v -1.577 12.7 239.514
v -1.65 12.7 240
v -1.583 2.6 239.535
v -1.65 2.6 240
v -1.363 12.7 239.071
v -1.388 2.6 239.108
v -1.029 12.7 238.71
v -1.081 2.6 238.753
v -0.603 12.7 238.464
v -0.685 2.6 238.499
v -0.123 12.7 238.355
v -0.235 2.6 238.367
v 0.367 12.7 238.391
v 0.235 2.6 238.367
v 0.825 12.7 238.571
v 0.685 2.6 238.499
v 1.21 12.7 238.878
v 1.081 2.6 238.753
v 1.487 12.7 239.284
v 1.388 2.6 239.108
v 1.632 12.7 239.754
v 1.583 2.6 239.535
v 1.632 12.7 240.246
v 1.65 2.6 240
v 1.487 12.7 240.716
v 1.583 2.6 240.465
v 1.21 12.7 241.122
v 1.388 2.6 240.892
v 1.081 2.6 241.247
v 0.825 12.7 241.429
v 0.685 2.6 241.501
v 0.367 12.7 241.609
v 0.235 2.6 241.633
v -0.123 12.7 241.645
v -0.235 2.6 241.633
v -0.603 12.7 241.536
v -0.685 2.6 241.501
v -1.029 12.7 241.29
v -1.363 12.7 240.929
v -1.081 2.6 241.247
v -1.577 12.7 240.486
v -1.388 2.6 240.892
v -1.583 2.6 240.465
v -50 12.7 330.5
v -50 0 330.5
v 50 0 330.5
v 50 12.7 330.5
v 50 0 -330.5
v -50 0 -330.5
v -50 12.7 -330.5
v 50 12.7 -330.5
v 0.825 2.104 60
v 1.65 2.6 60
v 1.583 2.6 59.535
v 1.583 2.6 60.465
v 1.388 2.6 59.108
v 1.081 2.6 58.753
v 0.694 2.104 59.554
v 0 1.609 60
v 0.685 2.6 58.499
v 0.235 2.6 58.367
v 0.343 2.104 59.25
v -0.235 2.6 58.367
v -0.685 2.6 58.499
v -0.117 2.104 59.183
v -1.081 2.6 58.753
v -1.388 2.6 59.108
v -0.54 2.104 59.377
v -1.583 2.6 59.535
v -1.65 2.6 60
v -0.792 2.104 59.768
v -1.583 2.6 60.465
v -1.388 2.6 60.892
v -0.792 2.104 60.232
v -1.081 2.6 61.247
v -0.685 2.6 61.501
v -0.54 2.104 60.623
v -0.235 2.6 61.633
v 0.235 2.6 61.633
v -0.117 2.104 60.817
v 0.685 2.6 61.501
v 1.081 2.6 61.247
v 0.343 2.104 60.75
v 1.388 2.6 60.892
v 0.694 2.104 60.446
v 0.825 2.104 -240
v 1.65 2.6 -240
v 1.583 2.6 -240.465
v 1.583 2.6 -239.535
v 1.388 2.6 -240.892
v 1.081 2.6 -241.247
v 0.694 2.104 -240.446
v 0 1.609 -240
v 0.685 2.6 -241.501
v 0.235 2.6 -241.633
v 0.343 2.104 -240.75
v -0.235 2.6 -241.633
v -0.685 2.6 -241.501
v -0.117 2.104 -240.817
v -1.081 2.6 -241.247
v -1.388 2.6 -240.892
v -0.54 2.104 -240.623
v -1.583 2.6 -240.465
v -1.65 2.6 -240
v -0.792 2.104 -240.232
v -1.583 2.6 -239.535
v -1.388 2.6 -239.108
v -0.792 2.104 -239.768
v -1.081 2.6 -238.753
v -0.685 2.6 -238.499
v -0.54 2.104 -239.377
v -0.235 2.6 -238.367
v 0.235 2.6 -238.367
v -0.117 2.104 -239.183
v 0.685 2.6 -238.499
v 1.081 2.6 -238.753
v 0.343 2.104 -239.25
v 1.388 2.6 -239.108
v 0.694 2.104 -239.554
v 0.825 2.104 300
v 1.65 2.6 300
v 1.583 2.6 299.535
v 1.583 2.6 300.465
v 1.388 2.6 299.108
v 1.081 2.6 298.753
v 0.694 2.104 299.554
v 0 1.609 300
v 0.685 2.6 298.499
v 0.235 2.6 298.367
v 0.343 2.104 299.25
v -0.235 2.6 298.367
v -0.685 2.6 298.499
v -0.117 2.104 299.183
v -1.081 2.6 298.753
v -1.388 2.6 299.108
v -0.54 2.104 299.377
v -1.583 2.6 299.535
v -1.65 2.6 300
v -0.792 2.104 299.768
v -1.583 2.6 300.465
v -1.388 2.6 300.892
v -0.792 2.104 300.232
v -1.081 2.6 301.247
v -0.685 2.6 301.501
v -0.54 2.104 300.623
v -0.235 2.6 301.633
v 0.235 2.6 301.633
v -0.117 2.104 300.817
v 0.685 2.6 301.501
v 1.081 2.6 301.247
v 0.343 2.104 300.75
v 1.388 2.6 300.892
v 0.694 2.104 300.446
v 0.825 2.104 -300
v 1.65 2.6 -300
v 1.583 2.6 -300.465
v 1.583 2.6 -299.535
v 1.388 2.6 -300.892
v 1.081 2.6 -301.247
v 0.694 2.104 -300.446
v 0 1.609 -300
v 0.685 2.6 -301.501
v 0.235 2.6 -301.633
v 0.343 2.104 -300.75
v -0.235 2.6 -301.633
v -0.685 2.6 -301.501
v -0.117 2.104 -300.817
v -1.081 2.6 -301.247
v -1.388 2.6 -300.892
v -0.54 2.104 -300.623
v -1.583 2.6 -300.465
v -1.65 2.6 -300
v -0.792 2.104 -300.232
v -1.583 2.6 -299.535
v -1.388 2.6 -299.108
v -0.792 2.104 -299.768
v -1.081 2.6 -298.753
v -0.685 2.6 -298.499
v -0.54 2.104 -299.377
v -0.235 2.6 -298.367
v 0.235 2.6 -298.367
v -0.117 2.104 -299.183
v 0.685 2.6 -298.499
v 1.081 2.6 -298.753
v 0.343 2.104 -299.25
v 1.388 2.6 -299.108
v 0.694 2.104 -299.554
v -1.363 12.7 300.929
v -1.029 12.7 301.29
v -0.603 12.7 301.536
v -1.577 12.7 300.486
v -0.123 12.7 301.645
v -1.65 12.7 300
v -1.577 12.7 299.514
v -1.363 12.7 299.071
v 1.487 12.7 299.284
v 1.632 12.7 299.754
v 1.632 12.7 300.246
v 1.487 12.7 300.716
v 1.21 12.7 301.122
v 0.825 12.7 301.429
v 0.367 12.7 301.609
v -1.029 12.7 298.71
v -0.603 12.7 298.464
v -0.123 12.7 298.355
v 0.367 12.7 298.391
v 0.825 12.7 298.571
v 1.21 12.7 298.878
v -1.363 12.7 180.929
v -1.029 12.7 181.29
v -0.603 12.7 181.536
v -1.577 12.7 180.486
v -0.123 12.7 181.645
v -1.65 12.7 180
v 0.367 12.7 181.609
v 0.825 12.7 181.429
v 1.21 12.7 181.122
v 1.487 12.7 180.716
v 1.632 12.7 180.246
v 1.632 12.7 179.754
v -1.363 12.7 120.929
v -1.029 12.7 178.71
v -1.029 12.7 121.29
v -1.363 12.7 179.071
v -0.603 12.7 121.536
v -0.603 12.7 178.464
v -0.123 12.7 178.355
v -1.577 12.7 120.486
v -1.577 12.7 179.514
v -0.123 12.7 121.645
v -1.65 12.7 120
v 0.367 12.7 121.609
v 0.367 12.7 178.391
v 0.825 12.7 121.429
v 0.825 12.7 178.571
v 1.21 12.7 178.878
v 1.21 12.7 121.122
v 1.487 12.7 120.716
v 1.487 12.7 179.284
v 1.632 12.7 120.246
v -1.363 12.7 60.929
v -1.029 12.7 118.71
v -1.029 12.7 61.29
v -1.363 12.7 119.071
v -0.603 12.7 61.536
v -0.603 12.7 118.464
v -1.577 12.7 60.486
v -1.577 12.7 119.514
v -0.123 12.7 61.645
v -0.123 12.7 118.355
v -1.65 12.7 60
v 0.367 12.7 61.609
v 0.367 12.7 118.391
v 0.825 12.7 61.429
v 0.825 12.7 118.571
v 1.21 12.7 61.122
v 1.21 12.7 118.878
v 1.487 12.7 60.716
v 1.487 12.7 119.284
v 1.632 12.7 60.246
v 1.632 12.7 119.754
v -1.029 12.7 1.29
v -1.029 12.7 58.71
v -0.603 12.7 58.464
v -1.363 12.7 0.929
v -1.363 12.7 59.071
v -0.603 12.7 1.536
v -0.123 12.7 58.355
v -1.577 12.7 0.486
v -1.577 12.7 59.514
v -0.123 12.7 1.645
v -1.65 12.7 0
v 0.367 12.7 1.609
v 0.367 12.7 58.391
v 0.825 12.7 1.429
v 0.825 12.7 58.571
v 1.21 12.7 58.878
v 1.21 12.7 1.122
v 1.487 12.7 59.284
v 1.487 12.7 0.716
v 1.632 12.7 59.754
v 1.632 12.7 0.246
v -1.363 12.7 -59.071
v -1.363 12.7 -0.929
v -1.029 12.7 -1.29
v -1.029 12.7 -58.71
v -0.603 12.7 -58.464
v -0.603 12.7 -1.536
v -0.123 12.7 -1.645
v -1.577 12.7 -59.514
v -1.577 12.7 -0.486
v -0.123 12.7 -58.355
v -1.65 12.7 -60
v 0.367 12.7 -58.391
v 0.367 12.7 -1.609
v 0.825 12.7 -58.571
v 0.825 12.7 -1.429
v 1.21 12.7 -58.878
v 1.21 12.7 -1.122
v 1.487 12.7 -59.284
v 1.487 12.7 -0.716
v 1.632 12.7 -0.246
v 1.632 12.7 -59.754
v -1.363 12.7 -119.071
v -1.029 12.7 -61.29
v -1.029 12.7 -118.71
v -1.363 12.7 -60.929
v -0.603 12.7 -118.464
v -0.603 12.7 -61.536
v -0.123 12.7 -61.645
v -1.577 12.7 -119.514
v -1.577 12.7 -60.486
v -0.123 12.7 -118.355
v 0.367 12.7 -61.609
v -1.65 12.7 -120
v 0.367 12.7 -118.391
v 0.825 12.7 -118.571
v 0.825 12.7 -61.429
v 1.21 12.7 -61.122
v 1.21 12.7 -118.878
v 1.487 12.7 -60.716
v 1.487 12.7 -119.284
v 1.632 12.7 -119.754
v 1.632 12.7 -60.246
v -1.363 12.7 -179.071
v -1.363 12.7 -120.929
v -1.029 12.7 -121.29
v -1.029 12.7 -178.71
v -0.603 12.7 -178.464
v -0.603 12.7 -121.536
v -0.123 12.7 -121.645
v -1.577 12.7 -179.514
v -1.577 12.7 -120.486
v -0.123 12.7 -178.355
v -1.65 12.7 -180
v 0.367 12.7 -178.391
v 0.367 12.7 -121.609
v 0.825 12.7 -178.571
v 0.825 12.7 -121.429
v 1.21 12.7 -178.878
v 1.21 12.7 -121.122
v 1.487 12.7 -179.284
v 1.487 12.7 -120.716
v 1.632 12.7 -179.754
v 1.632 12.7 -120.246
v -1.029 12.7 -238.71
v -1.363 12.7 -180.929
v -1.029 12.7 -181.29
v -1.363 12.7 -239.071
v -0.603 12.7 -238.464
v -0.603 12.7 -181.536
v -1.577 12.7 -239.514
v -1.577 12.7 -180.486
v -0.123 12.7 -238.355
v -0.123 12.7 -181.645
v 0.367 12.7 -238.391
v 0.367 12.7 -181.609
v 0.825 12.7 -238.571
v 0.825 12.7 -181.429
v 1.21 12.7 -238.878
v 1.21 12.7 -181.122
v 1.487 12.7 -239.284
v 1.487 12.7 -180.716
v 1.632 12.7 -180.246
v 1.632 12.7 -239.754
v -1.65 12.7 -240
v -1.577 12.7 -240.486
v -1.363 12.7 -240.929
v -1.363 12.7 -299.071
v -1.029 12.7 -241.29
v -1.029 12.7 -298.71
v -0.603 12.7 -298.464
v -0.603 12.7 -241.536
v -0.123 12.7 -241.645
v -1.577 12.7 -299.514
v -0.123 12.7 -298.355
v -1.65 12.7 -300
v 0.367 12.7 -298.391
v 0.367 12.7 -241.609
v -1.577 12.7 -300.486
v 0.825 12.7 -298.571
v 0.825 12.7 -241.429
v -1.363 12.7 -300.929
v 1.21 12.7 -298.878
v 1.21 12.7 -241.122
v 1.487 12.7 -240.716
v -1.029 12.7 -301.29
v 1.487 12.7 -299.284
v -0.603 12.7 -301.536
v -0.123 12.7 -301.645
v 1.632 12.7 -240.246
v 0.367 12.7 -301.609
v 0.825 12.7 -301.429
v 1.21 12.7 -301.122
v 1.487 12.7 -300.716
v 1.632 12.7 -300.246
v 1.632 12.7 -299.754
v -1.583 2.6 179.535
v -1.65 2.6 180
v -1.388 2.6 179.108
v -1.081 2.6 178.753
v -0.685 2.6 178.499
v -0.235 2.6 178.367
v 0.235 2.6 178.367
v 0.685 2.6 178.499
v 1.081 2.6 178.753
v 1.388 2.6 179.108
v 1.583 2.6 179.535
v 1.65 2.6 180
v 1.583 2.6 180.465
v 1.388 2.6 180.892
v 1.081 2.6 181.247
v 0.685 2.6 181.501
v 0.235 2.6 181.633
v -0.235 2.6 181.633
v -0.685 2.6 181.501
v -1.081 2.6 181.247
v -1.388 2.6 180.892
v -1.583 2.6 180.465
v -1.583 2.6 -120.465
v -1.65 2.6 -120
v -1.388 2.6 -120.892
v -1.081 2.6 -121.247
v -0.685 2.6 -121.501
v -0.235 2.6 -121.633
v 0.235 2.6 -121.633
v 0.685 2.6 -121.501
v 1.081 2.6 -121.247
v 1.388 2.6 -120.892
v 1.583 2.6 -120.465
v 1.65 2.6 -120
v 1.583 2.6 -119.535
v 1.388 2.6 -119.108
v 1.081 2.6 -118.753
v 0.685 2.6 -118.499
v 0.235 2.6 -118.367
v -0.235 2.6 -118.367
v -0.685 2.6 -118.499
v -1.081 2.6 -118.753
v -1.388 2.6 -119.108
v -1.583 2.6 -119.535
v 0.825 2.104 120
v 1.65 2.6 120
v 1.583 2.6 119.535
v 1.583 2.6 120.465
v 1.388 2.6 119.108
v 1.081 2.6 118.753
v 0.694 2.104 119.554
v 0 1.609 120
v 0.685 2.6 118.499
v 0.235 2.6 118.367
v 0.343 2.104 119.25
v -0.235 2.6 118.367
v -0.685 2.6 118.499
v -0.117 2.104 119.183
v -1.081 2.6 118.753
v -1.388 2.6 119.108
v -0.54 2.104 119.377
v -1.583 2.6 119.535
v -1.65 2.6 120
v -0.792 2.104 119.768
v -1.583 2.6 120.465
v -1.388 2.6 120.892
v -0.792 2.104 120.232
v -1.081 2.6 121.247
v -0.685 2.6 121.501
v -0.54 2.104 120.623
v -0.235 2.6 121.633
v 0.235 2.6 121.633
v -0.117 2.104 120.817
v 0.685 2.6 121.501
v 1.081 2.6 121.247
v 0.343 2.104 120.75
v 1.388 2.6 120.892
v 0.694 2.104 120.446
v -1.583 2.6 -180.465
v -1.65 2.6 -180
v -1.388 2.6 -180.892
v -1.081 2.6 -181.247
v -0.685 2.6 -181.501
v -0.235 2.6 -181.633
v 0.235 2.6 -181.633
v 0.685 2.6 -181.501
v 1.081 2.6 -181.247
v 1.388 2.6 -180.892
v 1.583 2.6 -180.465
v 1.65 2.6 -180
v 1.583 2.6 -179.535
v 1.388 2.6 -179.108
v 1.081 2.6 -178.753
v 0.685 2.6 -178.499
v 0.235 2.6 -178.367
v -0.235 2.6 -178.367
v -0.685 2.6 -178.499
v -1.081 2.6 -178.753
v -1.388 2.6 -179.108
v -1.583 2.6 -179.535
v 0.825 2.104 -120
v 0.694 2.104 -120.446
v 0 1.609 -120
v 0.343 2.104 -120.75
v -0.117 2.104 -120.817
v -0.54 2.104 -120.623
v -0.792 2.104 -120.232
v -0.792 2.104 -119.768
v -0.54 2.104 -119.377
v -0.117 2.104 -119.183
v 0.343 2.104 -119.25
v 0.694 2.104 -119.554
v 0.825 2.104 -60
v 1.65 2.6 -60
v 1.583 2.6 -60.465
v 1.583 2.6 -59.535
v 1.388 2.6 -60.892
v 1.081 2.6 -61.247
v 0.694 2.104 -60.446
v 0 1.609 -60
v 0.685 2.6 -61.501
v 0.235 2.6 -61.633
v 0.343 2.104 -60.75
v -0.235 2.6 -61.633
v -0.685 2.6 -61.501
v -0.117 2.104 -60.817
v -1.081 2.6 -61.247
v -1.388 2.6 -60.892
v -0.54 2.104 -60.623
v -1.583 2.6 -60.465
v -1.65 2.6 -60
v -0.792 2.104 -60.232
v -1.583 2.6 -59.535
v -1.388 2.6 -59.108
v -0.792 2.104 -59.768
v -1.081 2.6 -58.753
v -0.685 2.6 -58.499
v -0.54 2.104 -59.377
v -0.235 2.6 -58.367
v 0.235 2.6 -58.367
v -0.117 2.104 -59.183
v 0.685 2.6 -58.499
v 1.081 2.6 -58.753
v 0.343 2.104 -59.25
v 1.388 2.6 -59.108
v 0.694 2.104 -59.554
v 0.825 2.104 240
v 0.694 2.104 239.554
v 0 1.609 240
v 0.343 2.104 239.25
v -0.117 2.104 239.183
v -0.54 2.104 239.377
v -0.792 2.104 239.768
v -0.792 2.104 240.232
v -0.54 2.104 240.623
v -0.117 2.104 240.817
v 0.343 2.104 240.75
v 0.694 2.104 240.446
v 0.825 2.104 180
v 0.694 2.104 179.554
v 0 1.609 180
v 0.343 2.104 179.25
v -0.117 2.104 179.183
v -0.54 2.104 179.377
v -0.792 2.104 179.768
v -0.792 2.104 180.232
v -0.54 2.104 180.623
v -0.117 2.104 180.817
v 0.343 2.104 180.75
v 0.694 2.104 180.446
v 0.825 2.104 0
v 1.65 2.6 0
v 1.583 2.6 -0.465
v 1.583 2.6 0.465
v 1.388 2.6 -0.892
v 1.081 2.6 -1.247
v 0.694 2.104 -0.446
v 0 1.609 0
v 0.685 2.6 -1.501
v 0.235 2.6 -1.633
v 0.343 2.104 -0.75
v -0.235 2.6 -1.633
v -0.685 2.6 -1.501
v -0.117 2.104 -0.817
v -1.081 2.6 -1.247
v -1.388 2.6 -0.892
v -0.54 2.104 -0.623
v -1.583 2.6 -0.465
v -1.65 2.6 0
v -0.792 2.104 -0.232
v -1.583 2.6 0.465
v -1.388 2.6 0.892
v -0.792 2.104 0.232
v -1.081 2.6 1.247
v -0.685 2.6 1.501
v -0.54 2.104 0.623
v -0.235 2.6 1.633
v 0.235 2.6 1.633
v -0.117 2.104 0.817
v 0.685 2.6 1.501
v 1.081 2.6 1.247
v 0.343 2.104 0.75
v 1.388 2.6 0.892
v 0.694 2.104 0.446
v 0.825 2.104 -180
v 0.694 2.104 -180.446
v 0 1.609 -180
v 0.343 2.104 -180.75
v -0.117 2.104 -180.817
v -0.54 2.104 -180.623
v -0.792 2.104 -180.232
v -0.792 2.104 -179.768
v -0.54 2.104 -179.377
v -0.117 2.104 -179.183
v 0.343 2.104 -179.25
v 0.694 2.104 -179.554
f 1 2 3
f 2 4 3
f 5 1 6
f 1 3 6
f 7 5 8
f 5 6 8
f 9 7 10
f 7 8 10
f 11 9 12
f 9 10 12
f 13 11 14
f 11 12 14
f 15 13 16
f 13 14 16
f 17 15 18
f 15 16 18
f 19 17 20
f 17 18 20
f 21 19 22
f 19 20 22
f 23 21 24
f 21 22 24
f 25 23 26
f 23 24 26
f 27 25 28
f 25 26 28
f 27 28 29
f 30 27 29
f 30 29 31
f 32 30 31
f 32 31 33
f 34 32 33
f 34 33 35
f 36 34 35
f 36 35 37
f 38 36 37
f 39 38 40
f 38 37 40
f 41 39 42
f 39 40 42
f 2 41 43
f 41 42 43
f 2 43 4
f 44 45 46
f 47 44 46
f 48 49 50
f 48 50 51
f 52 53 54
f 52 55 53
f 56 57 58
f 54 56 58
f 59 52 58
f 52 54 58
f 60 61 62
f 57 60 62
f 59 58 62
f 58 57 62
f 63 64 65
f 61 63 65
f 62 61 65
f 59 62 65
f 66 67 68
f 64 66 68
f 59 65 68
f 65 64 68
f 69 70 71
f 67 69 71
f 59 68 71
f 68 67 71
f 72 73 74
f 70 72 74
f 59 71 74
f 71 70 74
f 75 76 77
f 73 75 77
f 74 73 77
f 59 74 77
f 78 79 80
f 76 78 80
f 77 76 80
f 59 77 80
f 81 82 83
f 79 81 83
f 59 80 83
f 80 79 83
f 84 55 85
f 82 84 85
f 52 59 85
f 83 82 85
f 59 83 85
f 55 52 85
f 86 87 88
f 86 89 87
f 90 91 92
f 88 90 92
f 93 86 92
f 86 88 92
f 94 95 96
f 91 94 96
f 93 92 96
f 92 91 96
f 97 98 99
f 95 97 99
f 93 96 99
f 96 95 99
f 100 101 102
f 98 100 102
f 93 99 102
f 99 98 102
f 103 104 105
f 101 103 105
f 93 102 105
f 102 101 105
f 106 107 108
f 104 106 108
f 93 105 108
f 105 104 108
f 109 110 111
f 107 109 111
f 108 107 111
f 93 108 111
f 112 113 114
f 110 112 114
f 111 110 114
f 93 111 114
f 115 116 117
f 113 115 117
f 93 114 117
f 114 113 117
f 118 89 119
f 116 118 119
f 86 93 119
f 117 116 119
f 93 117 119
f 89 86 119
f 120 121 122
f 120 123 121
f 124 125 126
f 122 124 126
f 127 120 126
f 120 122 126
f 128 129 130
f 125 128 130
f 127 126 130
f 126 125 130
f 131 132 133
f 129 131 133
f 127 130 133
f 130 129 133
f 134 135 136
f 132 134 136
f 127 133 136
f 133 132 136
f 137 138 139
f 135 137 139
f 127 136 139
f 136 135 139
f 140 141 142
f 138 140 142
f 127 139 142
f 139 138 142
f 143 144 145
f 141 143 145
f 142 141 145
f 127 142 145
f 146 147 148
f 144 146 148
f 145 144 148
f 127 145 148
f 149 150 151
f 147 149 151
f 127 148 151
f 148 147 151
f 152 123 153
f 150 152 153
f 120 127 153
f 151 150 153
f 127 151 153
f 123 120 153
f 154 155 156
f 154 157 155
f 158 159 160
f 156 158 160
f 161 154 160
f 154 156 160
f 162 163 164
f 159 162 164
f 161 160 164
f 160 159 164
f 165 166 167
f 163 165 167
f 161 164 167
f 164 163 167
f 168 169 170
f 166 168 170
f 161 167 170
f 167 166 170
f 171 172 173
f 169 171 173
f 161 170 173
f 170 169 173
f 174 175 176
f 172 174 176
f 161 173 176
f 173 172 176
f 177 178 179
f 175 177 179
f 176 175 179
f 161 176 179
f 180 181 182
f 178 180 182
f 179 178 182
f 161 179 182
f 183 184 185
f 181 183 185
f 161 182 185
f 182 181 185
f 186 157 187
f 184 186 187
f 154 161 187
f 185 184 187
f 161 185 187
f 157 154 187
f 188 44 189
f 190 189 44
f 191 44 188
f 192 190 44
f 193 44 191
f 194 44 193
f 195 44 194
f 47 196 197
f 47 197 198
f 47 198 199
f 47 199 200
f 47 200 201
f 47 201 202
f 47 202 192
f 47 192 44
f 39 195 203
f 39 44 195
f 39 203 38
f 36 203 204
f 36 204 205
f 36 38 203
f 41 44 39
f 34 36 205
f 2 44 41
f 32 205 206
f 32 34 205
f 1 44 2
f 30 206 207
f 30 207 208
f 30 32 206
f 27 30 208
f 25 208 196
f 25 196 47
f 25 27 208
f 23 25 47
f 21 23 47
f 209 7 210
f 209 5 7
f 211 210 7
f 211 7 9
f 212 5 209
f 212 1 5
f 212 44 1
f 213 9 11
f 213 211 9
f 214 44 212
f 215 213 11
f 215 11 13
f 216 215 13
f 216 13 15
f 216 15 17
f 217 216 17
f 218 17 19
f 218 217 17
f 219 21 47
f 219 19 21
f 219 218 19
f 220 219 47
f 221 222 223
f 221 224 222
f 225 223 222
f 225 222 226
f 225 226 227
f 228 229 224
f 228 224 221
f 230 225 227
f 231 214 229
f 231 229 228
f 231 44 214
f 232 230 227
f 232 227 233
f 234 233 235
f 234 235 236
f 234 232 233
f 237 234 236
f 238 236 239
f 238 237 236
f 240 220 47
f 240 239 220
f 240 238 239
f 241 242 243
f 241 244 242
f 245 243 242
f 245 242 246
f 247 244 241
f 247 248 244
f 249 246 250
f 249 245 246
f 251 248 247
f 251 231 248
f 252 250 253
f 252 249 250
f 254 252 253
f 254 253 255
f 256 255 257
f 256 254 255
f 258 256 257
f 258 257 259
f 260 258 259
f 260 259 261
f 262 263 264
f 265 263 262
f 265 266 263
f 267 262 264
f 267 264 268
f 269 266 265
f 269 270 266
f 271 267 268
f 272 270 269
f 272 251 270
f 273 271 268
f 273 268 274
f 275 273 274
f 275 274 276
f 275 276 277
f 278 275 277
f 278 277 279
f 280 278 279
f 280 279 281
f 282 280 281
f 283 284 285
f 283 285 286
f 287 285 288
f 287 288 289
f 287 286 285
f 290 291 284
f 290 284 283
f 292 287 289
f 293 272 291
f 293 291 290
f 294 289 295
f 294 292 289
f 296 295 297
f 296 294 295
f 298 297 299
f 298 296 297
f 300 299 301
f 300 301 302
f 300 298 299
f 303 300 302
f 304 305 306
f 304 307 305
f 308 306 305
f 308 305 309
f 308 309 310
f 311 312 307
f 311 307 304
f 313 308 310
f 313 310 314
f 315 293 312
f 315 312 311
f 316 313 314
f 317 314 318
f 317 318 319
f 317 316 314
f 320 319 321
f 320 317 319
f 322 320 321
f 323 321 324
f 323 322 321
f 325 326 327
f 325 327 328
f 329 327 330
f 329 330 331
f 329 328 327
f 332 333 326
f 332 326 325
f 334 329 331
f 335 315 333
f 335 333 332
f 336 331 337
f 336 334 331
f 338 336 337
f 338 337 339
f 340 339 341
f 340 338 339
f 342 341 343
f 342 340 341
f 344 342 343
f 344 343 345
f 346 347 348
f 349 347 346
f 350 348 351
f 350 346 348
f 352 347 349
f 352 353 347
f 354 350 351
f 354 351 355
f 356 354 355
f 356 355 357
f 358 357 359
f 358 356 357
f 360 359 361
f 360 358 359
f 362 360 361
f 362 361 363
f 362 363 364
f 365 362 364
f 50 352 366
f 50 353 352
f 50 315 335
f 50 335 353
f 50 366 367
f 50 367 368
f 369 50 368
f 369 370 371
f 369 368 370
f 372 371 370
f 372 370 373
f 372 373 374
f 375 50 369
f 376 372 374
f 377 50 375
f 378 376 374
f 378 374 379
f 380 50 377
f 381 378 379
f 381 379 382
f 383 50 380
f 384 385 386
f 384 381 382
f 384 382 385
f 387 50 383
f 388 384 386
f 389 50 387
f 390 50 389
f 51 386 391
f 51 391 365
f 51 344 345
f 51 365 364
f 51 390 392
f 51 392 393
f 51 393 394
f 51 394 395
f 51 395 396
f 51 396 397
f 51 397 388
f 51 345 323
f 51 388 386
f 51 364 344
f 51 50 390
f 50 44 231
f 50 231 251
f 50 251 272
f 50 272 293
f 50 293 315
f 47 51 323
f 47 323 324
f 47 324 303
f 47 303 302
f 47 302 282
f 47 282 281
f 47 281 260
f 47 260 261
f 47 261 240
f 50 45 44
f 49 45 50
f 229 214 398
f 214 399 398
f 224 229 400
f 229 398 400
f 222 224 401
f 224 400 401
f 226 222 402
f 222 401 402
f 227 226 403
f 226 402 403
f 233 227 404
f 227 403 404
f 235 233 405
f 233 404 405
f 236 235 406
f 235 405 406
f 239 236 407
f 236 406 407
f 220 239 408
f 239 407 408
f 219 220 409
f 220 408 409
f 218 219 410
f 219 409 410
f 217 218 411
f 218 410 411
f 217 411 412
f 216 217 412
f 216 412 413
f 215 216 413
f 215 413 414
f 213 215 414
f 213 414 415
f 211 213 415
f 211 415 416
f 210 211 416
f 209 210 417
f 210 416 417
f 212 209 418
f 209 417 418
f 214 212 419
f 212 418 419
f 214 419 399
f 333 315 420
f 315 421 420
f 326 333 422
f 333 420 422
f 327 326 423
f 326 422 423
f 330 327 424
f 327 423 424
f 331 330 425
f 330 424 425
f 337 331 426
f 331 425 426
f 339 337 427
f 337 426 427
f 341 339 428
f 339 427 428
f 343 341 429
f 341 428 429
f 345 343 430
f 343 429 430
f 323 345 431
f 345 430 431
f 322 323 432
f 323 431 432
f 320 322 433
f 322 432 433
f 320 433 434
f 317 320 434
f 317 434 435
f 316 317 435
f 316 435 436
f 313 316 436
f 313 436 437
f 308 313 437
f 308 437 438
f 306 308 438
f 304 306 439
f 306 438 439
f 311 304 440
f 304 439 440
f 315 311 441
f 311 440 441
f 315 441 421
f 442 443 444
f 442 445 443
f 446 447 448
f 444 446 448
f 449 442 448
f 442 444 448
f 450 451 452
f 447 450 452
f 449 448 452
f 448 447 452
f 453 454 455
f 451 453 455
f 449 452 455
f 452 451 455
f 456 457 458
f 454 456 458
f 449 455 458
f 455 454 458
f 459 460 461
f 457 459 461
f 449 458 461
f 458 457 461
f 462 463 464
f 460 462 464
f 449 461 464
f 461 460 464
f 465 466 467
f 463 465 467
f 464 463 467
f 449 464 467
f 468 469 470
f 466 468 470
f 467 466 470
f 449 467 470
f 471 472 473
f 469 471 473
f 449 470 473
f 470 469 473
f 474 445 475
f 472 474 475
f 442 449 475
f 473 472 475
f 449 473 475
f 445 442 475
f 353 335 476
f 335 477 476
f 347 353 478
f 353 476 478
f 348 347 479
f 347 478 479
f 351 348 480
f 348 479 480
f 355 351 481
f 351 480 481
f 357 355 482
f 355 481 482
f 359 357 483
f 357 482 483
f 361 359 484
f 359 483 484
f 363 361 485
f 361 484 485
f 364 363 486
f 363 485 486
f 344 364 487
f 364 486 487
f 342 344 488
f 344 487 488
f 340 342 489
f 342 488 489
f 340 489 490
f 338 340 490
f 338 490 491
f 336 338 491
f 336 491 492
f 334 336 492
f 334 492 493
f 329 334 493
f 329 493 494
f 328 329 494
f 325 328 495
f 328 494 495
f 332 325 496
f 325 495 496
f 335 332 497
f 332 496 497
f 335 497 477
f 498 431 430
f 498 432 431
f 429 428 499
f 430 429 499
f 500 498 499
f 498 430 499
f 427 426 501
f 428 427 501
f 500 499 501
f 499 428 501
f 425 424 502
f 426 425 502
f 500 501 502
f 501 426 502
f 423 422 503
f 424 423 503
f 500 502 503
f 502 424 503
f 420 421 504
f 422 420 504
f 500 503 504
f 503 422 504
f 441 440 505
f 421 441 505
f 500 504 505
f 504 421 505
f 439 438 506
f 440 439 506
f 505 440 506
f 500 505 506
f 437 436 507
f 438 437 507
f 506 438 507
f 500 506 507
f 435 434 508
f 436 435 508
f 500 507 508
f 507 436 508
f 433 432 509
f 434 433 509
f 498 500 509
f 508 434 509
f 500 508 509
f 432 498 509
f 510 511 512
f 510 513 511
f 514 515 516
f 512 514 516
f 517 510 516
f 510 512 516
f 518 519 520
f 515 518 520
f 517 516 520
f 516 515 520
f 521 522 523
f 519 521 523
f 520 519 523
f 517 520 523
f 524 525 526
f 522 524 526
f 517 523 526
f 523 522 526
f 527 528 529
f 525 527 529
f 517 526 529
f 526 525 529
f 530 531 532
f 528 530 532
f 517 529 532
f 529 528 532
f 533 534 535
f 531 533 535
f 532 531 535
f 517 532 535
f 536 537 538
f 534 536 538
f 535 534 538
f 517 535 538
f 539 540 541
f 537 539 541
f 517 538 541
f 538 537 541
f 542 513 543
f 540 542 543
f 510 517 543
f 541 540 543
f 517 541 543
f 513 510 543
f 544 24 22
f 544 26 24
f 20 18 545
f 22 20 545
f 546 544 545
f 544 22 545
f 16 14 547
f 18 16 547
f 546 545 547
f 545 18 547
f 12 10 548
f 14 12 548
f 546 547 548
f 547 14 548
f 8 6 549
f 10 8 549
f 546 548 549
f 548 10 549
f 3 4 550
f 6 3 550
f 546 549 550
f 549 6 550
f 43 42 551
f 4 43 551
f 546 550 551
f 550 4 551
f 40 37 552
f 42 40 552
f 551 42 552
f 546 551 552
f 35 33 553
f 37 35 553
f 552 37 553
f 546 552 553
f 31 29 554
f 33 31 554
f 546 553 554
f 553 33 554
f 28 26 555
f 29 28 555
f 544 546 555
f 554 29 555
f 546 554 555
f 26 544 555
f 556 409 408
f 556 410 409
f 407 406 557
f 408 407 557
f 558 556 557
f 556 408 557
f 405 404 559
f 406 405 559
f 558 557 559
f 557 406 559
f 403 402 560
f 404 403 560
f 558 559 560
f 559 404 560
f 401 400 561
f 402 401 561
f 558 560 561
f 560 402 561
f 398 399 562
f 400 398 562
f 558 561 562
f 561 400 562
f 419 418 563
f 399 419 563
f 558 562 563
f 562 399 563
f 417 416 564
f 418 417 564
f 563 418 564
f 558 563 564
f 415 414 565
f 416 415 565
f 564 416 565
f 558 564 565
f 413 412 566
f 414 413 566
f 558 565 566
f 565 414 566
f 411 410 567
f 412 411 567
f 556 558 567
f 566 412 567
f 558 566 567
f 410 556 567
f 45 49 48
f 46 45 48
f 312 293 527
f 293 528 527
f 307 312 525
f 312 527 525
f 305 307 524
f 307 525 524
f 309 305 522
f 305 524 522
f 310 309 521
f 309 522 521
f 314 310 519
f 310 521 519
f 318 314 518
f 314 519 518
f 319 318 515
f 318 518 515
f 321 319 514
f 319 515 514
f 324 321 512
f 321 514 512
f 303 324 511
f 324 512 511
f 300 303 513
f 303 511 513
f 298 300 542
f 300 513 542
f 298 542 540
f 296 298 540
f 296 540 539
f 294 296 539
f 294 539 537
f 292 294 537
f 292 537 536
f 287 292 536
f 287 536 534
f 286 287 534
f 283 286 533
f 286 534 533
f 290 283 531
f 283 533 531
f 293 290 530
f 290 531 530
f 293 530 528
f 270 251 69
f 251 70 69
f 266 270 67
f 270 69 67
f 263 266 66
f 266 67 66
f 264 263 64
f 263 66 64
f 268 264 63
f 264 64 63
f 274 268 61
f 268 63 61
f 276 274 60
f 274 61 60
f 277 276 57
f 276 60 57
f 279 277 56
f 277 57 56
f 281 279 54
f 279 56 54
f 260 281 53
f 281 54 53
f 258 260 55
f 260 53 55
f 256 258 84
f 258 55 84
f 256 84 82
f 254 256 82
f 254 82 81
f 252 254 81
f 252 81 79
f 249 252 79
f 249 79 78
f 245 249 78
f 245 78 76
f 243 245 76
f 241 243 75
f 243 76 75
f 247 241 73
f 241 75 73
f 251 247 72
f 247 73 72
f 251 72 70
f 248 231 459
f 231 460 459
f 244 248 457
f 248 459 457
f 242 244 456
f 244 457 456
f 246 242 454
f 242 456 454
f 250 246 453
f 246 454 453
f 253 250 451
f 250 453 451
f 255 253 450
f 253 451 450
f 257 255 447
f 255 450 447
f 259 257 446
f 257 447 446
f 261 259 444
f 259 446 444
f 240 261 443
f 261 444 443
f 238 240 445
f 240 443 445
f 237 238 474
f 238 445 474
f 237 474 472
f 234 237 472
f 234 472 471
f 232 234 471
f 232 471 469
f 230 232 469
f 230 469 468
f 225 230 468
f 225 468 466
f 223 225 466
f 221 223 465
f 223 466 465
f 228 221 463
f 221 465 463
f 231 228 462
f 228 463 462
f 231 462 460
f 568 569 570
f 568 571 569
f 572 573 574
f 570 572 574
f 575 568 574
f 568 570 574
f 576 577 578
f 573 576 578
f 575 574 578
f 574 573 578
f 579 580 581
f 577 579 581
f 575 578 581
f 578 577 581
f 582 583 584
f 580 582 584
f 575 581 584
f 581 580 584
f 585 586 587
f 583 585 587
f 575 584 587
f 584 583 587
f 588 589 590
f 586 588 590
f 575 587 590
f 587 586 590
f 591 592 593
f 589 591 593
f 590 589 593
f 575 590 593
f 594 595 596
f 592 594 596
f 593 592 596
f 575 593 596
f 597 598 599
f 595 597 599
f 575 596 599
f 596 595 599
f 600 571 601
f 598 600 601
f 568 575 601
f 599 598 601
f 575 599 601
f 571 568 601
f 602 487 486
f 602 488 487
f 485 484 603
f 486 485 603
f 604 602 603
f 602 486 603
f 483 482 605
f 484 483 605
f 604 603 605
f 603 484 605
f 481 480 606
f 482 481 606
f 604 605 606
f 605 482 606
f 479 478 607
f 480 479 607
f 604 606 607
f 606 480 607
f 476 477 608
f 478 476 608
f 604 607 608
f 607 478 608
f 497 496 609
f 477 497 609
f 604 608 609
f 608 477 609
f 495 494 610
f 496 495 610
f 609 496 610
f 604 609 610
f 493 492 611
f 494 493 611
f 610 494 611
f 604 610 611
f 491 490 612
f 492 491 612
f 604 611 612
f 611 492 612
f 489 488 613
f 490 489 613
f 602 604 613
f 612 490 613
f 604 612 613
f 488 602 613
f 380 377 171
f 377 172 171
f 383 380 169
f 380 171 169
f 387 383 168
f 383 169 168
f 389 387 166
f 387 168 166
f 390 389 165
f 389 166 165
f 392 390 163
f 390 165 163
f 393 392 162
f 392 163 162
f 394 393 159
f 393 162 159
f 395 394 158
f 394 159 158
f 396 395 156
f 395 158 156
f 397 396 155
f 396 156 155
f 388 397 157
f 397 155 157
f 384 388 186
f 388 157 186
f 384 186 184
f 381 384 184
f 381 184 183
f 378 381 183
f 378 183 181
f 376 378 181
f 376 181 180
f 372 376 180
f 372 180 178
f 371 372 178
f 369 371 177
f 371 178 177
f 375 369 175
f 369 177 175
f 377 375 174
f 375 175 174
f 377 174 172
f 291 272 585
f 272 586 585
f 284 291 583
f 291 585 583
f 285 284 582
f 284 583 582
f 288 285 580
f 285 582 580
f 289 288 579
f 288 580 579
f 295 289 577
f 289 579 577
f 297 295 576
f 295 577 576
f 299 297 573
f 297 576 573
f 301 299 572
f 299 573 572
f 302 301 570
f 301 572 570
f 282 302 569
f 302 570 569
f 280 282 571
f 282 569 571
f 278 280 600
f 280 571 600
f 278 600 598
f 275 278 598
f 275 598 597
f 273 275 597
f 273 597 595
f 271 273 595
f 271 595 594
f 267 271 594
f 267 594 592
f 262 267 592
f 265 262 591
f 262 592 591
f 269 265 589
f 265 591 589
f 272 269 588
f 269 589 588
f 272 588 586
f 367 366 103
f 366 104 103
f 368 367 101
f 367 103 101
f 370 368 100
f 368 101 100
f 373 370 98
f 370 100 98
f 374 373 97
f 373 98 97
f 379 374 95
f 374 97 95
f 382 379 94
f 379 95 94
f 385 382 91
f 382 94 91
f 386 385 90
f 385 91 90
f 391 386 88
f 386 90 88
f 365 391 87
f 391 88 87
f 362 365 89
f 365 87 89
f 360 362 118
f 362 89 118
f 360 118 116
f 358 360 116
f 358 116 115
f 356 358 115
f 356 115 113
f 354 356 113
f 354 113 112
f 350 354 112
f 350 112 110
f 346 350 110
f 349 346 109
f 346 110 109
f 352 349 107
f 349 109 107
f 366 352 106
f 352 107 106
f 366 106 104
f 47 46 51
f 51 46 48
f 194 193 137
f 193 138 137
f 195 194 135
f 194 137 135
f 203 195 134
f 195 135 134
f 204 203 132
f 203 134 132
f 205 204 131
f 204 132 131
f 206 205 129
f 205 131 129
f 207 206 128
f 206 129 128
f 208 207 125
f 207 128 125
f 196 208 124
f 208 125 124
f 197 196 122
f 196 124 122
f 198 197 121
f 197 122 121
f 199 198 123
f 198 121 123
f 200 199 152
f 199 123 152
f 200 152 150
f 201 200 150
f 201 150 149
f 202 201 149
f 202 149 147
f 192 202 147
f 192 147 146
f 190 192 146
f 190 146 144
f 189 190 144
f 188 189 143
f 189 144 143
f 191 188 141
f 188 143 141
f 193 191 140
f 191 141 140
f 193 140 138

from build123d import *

# Parameters (mm, degrees)
SKETCH2_W                 = 100
SKETCH2_H                 = 661
BOSS_EXTRUDE1_DEPTH       = 12.7
M4X0_7_TAPPED_HOLE1_D     = 3.3
M4X0_7_TAPPED_HOLE1_DEPTH = 10.1
M4X0_7_TAPPED_HOLE1_TIP   = 0.991420021


with BuildPart() as part:
    # Sketch2 → Boss-Extrude1 (new body)
    with BuildSketch(Plane(origin=(0, 0, 0), x_dir=(1, 0, 0), z_dir=(0, 1, 0))):
        Rectangle(SKETCH2_W, SKETCH2_H)
    extrude(amount=BOSS_EXTRUDE1_DEPTH)

    # M4x0.7 Tapped Hole1
    with Locations(Plane(origin=(0, 12.7, 0), x_dir=(1, 0, 0), z_dir=(0, 1, 0))):
        with Locations((0, -300), (0, -240), (0, -180), (0, -120), (0, -60), (0, 0), (0, 60), (0, 120), (0, 180), (0, 240), (0, 300)):
            Hole(M4X0_7_TAPPED_HOLE1_D / 2, depth=M4X0_7_TAPPED_HOLE1_DEPTH)
            with Locations((0, 0, -(M4X0_7_TAPPED_HOLE1_DEPTH + M4X0_7_TAPPED_HOLE1_TIP / 2))):  # 118° drill point
                Cone(0, M4X0_7_TAPPED_HOLE1_D / 2, M4X0_7_TAPPED_HOLE1_TIP, mode=Mode.SUBTRACT)


solid = part.part
